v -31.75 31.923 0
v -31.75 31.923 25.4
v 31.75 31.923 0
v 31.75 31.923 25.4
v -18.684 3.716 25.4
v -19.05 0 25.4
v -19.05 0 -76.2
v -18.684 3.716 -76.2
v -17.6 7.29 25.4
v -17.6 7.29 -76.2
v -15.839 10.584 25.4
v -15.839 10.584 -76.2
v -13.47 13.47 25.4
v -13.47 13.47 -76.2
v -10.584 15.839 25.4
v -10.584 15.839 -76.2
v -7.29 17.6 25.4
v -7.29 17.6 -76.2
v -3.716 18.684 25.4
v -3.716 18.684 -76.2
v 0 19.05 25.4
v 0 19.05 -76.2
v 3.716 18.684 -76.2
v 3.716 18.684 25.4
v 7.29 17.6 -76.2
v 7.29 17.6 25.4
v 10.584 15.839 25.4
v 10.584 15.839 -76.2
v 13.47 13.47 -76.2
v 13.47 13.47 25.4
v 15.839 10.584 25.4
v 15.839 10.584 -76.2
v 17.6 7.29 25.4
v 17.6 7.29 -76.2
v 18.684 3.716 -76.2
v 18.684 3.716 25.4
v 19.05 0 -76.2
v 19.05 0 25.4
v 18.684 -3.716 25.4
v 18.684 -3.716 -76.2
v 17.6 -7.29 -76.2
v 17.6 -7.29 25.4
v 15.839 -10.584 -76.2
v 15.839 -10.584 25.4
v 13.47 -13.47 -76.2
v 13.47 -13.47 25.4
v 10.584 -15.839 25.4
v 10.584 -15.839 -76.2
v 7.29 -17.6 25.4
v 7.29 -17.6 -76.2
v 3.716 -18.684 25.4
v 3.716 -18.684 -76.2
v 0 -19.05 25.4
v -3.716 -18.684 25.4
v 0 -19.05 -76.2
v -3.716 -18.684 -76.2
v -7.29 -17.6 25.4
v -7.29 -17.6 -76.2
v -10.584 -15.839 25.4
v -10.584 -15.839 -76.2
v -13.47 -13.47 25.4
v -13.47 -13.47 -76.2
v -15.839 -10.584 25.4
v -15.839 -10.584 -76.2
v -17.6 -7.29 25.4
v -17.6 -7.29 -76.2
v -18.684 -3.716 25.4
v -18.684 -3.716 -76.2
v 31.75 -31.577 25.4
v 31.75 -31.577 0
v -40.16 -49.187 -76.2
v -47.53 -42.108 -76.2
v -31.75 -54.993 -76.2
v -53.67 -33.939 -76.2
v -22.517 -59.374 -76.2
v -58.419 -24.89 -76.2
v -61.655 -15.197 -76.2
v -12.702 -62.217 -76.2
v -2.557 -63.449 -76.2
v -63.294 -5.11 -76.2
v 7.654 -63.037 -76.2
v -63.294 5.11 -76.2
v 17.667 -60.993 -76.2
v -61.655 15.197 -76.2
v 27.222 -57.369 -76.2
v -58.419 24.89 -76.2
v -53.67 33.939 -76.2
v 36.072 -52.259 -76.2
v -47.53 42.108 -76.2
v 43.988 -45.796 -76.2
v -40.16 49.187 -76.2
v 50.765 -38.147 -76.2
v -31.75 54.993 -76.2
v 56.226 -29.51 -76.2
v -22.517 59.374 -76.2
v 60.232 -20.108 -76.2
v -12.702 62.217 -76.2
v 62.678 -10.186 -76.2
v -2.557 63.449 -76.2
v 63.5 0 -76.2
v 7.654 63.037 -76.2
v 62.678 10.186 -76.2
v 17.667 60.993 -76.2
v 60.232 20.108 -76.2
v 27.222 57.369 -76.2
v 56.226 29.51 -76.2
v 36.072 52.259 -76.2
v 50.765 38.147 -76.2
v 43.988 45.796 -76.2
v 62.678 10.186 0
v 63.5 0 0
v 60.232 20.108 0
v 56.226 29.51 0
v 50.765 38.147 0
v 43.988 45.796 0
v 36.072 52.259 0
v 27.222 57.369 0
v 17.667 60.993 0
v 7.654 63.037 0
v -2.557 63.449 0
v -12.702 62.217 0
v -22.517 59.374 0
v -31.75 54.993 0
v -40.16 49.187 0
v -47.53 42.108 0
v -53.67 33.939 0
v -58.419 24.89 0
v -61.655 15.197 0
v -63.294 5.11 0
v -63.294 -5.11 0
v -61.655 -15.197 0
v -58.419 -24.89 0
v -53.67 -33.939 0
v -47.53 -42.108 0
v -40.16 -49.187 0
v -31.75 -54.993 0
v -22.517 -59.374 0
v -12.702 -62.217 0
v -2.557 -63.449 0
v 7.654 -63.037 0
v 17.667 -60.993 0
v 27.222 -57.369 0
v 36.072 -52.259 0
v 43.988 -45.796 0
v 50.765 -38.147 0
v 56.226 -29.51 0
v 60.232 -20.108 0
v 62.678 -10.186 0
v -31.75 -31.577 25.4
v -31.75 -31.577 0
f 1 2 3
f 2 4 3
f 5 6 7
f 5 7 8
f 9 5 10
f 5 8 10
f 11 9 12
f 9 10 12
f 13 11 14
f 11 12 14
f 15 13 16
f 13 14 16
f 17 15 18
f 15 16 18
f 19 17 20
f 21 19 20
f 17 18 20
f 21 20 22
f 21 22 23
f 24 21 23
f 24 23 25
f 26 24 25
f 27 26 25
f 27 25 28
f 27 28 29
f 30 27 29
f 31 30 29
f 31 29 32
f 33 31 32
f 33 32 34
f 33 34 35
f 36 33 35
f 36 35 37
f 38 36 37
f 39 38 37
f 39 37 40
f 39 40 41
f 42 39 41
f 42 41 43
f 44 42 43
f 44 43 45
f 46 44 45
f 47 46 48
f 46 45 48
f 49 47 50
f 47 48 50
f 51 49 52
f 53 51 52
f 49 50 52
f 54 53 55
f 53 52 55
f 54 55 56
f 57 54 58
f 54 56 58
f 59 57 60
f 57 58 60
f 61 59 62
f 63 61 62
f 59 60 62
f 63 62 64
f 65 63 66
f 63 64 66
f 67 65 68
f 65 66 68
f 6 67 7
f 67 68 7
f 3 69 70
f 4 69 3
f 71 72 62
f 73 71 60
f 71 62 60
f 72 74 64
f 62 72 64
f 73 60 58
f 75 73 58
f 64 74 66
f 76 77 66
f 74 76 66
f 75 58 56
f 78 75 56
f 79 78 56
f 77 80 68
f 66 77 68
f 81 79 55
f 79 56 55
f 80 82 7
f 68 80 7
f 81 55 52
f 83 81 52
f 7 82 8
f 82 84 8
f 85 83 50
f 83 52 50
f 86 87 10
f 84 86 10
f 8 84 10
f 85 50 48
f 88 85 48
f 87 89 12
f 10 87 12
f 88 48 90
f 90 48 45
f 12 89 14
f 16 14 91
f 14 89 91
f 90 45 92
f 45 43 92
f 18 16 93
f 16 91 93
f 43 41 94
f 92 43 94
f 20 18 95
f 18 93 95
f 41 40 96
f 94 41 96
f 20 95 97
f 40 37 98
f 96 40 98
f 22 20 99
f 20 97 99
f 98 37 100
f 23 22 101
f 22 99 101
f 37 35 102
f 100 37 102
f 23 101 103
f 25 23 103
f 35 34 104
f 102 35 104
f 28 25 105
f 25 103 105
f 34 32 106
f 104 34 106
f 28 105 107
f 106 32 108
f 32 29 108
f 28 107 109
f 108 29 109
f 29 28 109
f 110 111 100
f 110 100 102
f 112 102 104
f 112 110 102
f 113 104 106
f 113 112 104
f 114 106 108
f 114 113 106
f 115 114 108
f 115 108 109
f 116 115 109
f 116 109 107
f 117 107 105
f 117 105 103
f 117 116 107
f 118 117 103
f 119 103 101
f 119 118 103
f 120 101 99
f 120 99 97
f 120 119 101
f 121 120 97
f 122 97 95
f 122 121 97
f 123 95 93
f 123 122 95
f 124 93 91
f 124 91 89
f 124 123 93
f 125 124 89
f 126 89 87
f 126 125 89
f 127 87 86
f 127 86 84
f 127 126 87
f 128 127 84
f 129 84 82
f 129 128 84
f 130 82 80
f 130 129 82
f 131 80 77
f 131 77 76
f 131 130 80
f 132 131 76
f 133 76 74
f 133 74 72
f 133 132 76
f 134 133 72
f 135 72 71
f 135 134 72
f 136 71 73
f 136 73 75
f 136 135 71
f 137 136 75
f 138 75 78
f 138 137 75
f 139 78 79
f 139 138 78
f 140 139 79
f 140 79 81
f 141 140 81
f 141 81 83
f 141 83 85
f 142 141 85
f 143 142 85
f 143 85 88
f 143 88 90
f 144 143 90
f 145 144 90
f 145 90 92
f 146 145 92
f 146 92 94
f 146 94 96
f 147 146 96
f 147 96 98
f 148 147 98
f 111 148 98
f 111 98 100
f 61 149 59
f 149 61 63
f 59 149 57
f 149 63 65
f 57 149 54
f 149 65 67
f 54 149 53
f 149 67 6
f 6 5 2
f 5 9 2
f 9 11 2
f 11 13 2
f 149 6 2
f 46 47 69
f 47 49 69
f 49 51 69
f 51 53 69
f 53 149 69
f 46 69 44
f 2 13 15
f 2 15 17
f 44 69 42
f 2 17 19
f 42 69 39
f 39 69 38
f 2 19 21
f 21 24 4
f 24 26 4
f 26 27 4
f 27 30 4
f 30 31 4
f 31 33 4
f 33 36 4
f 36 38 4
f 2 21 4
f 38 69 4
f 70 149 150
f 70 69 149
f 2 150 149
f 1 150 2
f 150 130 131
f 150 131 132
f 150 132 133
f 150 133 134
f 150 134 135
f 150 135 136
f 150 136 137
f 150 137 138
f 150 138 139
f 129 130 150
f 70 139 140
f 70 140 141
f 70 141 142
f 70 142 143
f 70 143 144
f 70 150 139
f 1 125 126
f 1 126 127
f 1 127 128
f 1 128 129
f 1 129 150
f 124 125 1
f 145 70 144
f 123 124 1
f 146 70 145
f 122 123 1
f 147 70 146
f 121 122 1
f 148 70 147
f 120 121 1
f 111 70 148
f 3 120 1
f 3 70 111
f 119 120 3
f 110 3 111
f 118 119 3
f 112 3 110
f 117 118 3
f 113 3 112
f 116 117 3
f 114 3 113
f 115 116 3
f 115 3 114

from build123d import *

# Parameters (mm, degrees)
F3_W      = 63.5
F3_H      = 25.4
F4_DEPTH  = 31.75
F4_FACE_W = 63.5
F4_FACE_H = 25.4
F5_DEPTH  = 31.75
F2_R      = 63.5
F6_DEPTH  = 76.2
F7_D      = 38.1


with BuildPart() as f4:
    # F3 (on Right) → F4 (new body)
    with BuildSketch(Plane.YZ):
        with Locations((0.173381, 12.7)):
            Rectangle(F3_W, F3_H)
    extrude(amount=F4_DEPTH)

    # F4_face (on face) → F5 (join)
    with BuildSketch(Plane(origin=(0, 0.173381, 12.7), x_dir=(0, 1, 0), z_dir=(-1, 0, 0))):
        Rectangle(F4_FACE_W, F4_FACE_H)
    extrude(amount=F5_DEPTH)

    # F2 (on Top) → F6 (join)
    with BuildSketch(Plane.XY):
        Circle(F2_R)
    extrude(amount=-F6_DEPTH)

    # F7 (through all)
    with Locations(Plane.XY.offset(25.4)):
        with Locations((0, 0)):
            Hole(F7_D / 2)


solid = f4.part
